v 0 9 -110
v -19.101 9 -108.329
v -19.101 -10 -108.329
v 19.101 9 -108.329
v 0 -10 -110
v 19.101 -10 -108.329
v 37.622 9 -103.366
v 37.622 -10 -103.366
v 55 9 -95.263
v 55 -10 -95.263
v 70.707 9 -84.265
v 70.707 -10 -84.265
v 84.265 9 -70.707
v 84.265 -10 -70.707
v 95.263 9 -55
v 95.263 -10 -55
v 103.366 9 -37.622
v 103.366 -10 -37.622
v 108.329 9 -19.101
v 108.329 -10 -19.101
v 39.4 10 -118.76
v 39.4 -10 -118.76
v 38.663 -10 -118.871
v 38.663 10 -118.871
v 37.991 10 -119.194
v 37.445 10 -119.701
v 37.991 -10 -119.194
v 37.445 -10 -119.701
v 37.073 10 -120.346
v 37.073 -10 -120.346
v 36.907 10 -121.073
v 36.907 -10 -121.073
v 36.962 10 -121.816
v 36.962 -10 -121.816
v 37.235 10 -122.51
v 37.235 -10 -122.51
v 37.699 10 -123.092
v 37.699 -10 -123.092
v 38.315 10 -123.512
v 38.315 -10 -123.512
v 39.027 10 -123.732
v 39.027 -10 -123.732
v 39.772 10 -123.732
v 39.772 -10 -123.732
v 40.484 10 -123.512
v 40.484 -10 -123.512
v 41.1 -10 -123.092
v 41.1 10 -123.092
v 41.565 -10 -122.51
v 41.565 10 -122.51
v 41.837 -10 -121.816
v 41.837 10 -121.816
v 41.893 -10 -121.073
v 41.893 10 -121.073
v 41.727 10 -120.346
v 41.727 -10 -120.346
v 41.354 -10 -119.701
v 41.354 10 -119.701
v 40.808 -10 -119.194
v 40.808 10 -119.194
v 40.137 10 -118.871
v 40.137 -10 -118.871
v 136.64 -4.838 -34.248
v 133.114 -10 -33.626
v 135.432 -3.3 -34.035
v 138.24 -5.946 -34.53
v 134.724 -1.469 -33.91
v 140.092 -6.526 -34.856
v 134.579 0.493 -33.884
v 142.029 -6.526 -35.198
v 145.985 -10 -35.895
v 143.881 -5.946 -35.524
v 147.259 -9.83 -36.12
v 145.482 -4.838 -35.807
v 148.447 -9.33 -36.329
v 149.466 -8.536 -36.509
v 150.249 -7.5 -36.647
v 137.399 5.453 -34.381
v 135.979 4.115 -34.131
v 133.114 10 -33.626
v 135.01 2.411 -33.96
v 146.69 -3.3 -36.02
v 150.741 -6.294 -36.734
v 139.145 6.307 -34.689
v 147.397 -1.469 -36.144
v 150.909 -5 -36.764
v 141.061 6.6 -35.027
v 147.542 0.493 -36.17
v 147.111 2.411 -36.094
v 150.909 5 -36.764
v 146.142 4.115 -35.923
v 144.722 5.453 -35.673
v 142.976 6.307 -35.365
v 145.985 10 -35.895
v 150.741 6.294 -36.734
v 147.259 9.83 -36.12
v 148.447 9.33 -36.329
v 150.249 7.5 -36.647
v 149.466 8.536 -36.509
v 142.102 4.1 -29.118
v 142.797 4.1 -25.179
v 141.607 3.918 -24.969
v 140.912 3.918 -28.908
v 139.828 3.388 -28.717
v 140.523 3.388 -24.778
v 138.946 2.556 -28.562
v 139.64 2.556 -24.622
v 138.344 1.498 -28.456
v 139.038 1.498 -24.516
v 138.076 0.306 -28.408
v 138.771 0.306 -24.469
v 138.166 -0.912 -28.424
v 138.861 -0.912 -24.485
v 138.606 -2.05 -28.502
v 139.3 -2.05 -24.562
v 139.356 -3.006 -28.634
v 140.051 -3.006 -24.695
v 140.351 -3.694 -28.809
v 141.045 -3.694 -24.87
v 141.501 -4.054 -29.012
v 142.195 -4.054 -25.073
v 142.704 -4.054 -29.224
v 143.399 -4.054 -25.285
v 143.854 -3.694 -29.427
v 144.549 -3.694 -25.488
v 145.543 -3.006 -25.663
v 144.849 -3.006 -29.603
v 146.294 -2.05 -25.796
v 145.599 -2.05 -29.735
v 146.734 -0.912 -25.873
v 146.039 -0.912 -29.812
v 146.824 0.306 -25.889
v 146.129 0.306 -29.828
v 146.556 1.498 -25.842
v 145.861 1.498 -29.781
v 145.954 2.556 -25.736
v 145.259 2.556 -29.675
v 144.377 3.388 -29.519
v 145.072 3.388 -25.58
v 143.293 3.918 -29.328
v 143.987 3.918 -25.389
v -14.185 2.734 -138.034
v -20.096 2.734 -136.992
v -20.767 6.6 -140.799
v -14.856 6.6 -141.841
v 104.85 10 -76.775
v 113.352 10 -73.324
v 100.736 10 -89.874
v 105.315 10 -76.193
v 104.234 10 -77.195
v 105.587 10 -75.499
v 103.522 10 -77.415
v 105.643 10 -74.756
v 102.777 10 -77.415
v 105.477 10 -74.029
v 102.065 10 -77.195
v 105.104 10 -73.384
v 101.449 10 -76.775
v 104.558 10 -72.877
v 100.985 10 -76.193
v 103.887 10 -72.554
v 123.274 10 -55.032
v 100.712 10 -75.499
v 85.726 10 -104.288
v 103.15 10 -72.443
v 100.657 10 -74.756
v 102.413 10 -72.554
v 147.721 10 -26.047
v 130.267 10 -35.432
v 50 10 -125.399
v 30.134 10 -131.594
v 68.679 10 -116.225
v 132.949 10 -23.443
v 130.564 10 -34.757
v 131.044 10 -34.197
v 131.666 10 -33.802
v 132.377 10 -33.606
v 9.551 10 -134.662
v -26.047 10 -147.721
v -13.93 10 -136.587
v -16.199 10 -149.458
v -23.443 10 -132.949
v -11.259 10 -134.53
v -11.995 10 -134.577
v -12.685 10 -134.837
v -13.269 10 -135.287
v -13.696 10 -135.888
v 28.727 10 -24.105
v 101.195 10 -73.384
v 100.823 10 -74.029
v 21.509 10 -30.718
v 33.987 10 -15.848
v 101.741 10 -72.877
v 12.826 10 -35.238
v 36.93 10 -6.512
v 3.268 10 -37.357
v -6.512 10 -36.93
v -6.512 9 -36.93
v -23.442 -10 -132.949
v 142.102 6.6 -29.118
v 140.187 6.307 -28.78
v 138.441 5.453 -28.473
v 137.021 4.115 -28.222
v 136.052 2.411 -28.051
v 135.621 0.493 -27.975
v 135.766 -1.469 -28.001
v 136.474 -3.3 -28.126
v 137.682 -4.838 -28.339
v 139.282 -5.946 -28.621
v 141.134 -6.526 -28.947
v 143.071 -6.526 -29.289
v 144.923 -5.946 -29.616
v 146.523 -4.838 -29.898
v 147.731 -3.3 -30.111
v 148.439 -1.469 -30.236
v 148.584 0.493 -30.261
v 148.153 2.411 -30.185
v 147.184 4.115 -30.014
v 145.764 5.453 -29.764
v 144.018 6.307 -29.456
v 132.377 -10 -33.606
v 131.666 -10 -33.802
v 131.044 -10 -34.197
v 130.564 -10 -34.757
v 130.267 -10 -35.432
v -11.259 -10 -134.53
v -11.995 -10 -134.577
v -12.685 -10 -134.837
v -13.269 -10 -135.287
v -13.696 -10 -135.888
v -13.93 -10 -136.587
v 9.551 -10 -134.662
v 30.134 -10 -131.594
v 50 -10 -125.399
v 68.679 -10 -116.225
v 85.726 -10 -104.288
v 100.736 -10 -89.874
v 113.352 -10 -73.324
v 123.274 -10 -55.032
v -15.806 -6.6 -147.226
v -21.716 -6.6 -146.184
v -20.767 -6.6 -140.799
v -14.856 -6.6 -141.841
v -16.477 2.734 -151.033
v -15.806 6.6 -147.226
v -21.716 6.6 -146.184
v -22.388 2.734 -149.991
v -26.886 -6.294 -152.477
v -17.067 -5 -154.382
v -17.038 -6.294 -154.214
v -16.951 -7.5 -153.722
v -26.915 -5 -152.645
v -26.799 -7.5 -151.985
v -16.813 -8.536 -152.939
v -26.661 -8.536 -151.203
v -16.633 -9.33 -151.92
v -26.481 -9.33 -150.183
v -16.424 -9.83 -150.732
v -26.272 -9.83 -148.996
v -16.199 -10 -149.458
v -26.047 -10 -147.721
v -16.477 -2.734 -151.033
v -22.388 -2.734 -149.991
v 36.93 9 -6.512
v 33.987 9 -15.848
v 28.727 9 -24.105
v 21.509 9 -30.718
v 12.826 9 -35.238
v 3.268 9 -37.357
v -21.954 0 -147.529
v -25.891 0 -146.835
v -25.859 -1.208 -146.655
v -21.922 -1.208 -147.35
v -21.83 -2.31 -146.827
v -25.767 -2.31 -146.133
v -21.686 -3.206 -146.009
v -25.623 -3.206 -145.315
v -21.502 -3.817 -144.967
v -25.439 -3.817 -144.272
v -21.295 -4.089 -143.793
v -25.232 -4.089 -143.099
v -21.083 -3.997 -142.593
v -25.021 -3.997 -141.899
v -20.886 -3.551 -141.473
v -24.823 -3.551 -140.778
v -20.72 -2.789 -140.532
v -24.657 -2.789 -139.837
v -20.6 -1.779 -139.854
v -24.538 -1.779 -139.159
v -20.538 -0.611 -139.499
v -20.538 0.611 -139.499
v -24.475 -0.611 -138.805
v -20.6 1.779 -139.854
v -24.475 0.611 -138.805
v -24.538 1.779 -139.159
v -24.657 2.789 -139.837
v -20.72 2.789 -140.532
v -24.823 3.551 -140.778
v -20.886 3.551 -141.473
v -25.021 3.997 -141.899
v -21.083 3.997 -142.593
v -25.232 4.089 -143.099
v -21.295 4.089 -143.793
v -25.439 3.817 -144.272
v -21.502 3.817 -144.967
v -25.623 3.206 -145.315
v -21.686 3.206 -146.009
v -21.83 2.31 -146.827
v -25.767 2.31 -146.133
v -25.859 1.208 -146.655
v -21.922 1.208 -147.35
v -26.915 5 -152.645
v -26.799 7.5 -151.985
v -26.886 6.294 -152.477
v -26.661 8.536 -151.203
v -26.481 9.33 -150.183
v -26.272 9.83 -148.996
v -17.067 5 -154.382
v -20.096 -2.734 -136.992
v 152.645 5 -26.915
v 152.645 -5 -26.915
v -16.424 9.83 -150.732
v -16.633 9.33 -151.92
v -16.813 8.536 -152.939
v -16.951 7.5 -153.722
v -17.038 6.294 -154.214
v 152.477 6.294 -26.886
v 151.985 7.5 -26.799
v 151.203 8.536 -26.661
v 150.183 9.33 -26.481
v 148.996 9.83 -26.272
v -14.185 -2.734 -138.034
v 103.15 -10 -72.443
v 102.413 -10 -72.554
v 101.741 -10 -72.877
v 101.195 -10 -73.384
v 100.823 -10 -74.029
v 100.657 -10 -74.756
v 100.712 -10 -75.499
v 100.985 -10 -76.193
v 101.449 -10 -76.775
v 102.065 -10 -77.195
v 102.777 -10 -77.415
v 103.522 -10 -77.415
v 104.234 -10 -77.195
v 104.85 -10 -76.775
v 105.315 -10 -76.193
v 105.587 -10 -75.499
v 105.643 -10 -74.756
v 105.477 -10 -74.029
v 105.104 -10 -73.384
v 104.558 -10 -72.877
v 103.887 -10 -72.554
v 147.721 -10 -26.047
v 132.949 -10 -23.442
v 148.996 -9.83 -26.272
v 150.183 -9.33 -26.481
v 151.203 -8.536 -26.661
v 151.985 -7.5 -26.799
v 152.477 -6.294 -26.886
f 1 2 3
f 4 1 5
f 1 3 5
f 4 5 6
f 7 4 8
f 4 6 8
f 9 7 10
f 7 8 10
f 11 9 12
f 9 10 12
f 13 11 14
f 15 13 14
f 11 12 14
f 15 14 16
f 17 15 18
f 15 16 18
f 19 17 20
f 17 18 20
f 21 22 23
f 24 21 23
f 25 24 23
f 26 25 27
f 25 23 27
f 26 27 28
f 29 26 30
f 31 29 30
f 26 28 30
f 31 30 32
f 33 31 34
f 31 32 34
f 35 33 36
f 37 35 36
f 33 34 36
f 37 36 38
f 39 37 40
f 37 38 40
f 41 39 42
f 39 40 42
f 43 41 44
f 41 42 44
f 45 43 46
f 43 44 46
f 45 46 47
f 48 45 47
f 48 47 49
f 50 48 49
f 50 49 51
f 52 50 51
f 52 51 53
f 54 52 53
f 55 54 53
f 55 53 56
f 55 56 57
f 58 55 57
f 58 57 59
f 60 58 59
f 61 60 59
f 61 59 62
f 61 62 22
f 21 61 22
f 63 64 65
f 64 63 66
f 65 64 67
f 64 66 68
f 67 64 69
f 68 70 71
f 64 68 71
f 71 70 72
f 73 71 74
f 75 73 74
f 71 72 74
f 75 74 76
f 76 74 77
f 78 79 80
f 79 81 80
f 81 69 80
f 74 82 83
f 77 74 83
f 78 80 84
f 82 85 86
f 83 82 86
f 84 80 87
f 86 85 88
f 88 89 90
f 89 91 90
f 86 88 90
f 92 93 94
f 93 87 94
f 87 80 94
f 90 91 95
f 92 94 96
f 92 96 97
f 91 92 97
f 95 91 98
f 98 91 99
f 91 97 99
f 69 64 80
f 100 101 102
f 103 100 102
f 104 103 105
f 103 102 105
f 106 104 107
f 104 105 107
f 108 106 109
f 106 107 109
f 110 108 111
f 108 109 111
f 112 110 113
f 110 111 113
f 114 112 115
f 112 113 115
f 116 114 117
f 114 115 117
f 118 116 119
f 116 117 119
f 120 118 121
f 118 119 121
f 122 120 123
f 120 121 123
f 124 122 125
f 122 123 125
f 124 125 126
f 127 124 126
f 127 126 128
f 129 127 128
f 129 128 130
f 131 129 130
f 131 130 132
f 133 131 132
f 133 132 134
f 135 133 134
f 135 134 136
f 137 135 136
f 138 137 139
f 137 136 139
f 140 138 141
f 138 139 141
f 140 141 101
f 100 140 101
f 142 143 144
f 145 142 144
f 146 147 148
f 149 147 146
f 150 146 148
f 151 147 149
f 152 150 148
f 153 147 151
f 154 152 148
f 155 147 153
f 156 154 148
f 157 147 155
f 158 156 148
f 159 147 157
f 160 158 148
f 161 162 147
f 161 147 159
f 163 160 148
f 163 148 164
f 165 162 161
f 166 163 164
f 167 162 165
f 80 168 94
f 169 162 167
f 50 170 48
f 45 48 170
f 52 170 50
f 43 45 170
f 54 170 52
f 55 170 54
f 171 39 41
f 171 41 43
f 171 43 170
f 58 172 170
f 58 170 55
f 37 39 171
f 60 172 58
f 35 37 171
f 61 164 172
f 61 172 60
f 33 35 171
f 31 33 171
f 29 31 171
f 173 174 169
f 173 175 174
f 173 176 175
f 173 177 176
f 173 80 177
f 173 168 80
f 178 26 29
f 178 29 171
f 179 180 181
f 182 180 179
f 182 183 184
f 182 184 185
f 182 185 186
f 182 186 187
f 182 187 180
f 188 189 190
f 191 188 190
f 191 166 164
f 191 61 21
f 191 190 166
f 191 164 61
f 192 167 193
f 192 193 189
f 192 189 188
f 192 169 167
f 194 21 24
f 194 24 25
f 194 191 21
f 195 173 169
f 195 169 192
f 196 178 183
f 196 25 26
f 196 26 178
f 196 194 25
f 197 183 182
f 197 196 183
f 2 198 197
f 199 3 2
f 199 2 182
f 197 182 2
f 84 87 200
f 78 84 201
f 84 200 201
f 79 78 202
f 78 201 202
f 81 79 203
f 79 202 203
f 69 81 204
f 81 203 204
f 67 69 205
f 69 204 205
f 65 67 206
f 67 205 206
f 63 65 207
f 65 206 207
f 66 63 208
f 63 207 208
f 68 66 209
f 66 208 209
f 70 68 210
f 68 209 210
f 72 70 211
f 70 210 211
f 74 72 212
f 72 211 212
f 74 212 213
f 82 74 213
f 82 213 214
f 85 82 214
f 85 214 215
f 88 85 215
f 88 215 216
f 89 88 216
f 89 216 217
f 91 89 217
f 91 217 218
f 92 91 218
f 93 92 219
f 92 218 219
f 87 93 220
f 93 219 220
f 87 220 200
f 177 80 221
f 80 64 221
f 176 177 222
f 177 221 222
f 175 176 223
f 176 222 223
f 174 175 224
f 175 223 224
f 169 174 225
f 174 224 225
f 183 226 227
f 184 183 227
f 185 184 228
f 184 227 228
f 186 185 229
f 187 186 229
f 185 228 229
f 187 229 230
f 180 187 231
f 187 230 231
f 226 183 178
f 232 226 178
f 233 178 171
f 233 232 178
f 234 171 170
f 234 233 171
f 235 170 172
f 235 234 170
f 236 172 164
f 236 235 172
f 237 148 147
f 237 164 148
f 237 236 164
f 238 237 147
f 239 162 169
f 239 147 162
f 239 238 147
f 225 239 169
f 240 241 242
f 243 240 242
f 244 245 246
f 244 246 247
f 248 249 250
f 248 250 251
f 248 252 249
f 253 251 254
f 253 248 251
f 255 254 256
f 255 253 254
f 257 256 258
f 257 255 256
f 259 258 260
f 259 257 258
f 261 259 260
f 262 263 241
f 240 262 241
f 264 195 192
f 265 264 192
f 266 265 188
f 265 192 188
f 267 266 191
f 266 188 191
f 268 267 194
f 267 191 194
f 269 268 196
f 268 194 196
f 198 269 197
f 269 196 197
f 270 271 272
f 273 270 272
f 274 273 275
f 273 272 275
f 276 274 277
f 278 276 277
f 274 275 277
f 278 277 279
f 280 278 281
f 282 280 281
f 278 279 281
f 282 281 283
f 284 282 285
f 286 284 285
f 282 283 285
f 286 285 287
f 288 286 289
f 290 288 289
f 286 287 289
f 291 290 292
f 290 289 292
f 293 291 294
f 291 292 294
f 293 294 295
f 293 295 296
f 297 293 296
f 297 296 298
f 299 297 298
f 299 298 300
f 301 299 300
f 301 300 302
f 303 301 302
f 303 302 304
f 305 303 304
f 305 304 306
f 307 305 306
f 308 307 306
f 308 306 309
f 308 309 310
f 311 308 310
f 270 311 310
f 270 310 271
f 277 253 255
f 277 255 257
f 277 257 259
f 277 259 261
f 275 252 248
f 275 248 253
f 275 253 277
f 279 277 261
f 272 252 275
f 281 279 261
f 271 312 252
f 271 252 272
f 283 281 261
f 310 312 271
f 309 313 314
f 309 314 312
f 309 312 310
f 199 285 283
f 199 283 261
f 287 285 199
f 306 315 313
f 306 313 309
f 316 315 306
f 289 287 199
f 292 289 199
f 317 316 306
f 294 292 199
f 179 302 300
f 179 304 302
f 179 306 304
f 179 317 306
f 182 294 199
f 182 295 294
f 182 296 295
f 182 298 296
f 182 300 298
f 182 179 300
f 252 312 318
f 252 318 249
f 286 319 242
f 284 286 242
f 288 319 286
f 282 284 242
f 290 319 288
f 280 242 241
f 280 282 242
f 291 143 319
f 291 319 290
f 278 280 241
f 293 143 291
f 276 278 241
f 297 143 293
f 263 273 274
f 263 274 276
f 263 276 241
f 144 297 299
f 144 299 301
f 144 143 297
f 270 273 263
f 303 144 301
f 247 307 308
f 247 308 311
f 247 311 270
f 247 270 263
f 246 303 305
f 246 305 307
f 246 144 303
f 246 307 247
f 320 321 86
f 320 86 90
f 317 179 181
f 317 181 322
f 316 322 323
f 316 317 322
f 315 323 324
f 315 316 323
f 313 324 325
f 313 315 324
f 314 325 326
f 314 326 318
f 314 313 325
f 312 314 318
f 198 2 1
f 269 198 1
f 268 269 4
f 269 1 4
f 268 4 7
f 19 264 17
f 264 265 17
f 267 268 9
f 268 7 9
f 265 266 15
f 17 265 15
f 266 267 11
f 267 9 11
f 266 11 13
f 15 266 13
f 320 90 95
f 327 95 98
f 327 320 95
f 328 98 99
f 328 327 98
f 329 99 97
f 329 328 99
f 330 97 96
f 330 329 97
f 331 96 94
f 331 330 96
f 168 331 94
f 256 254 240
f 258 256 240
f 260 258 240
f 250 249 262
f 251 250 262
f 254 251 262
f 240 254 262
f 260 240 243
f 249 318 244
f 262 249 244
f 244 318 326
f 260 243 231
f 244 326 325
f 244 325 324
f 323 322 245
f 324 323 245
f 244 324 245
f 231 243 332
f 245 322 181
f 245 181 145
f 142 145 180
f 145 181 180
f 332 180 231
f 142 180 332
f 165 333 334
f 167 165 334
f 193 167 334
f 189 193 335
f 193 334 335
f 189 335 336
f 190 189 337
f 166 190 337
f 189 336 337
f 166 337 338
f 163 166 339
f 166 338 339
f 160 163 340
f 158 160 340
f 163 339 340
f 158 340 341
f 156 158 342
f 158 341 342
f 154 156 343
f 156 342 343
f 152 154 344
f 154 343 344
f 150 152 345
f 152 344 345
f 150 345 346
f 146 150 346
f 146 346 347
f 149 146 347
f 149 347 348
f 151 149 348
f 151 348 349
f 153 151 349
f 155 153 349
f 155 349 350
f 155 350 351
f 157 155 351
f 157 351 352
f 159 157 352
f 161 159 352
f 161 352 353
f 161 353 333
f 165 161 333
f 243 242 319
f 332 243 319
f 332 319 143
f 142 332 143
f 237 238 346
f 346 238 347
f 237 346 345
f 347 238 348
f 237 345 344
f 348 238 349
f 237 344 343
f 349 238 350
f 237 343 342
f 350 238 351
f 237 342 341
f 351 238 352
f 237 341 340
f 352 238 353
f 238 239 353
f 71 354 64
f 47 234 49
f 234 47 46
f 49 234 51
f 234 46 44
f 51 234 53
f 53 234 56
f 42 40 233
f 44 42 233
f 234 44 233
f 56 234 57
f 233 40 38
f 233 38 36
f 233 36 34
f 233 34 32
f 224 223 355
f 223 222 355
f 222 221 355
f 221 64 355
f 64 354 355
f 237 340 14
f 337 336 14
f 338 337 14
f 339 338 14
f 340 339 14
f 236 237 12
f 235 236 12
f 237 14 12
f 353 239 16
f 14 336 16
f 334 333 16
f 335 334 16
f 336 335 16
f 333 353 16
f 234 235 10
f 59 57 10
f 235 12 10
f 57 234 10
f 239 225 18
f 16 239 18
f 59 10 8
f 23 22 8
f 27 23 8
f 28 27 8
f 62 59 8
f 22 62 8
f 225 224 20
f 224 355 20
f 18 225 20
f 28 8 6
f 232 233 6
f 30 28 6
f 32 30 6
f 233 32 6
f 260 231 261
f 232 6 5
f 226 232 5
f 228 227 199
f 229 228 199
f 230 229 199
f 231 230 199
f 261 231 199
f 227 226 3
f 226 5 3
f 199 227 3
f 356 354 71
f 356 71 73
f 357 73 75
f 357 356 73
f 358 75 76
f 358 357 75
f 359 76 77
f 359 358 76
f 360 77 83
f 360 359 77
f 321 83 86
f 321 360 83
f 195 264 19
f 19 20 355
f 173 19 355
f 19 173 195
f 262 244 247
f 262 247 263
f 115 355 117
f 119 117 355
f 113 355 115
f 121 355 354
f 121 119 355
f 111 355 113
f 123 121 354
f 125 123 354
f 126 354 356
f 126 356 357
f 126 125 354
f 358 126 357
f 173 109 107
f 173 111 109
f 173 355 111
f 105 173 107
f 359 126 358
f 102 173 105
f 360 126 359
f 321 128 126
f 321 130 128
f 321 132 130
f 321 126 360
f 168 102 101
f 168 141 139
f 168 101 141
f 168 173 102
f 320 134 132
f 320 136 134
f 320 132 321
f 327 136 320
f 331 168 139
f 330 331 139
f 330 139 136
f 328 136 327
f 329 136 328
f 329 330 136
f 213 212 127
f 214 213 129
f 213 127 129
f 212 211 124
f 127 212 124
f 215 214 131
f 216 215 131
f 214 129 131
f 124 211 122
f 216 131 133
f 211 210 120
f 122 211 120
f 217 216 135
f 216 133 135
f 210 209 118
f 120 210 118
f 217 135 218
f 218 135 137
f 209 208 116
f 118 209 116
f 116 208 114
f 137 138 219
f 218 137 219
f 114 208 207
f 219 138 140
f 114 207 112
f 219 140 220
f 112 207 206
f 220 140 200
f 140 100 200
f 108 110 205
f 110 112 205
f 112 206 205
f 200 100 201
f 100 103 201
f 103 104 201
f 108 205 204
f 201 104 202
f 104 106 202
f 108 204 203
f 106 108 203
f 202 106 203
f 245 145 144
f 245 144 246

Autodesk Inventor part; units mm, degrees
ref_plane "YZ Plane" through (0, 0, 0) normal (1, 0, 0) x (0, 1, 0)
ref_plane "XZ Plane" through (0, 0, 0) normal (0, 1, 0) x (-1, 0, 0)
ref_plane "XY Plane" through (0, 0, 0) normal (0, 0, 1) x (1, 0, 0)
sketch "Sketch1" plane through (0, 0, 0) normal (0, 1, 0) x (-1, 0, 0)
  circle A0 centre (0, 0) radius 135
  circle A1 centre (0, 0) radius 110
  dimension "d0" = 270
  dimension "d1" = 220
extrude "Extrusion1" add sketch "Sketch1" along normal mid plane 20
sketch "Sketch2" plane through (0, 10, 0) normal (0, 1, 0) x (1, 0, 0)
  circle A0 centre (0, 0) radius 37.5
  circle A1 centre (0, 0) radius 135
  dimension "d4" = 75
  dimension "d20" = 270
extrude "Extrusion2" add sketch "Sketch2" against normal blind 1
sketch "Sketch3" plane through (0, 10, 0) normal (0, 1, 0) x (1, 0, 0)
  circle A0 centre (0, 0) radius 127.5
  circle A1 centre (127.5, 0) radius 2.5
  circle A2 centre (103.1497, 74.9426) radius 2.5
  circle A3 centre (39.3997, 121.2597) radius 2.5
  circle A4 centre (-39.3997, 121.2597) radius 2.5
  circle A5 centre (-103.1497, 74.9426) radius 2.5
  circle A6 centre (-127.5, 0) radius 2.5
  circle A7 centre (-103.1497, -74.9426) radius 2.5
  circle A8 centre (-39.3997, -121.2597) radius 2.5
  circle A9 centre (39.3997, -121.2597) radius 2.5
  circle A10 centre (103.1497, -74.9426) radius 2.5
  dimension "d7" = 255
  dimension "d8" = 5
  dimension "d11" = 360
hole "Hole1" at (127.5, 10, 0) at (103.1497, 10, 74.9426) at (39.3997, 10, 121.2597) at (-39.3997, 10, 121.2597) at (-103.1497, 10, 74.9426) at (-127.5, 10, 0) at (-103.1497, 10, -74.9426) at (-39.3997, 10, -121.2597) at (39.3997, 10, -121.2597) at (103.1497, 10, -74.9426) direction (0, -1, 0) diameter 5 end through all
sketch "Sketch4" plane through (0, -10, 0) normal (0, -1, 0) x (1, 0, 0)
  circle A0 centre (0, 0) radius 135
  line L0 (0, 0) -> (132.949, -23.4425)
  line L1 (0, 0) -> (135, 0) construction
  line L2 (0, 0) -> (-23.4425, -132.949)
  circle A1 centre (0, 0) radius 135 projected
  line L3 (0, 0) -> (135, 0) construction
  line L4 (0, 0) -> (-132.949, 23.4425)
  dimension "d21" = 135
  dimension "d22" = 10
  dimension "d23" = 100
extrude "Extrusion3" cut sketch "Sketch4" against normal through all contours A0 L0 L4 | L4 L2 A0
sketch "Sketch5" plane through (-23.4425, -10, -132.949) normal (-0.9848, 0, 0.1736) x (0.1736, 0, 0.9848)
  line L0 (135, 20) -> (0, 20) projected
  line L1 (2.5, 20) -> (-15, 20)
  line L2 (-20, 15) -> (-20, 5)
  line L3 (-15, 0) -> (2.5, 0)
  line L4 (2.5, 0) -> (2.5, 20)
  line L5 (0, 0) -> (0, 20) projected
  arc A0 (-20, 5) -> (-15, 0) centre (-15, 5) ccw
  arc A1 (-15, 20) -> (-20, 15) centre (-15, 15) ccw
  point P0 (135, 10)
  point P1 (-20, 0)
  point P2 (-20, 20)
  point P3 (0, 20)
  dimension "d26" = 22.5
  dimension "d27" = 20
  dimension "d28" = 20
  dimension "d29" = 5
extrude "Extrusion4" add sketch "Sketch5" against normal blind 10
fillet "Fillet1" radius 2.5 1 edges at (-13.53, 0, -134.3203)
sketch "Sketch6" plane through (132.949, -10, -23.4425) normal (0.1736, 0, 0.9848) x (0.9848, 0, -0.1736)
  line L0 (-122.7273, 0) -> (0, 0) projected
  line L1 (-2.5, 0) -> (15, 0)
  line L2 (20, 5) -> (20, 15)
  line L3 (15, 20) -> (-2.5, 20)
  line L4 (-2.5, 20) -> (-2.5, 0)
  line L5 (0, 20) -> (0, 0) projected
  arc A0 (20, 15) -> (15, 20) centre (15, 15) ccw
  arc A1 (15, 0) -> (20, 5) centre (15, 5) ccw
  point P0 (-135, 10)
  point P1 (20, 20)
  point P2 (20, 0)
  point P3 (0, 0)
  dimension "d33" = 22.5
  dimension "d34" = 20
  dimension "d35" = 20
  dimension "d36" = 5
extrude "Extrusion5" add sketch "Sketch6" against normal blind 10
fillet "Fillet2" radius 2.5 1 edges at (130.8473, 0, -33.2262)
sketch "Sketch7" plane through (-13.5944, -10, -134.6855) normal (0.9848, 0, -0.1736) x (-0.1736, 0, -0.9848)
  line L0 (16.6, 12.7338) -> (16.6, 7.2662)
  line L1 (16.6, 7.2662) -> (12.7338, 3.4)
  line L2 (12.7338, 3.4) -> (7.2662, 3.4)
  line L3 (7.2662, 3.4) -> (3.4, 7.2662)
  line L4 (3.4, 7.2662) -> (3.4, 12.7338)
  line L5 (3.4, 12.7338) -> (7.2662, 16.6)
  line L6 (7.2662, 16.6) -> (12.7338, 16.6)
  line L7 (12.7338, 16.6) -> (16.6, 12.7338)
  line L8 (20, 5) -> (20, 15) projected
  line L9 (1.9306, 0) -> (15, 0) projected
  point P0 (-135, 10)
  point P1 (10, 10)
  point P2 (20, 10)
  dimension "d40" = 10
  dimension "d41" = 10
  dimension "d42" = 13.2
extrude "Extrusion6" cut sketch "Sketch7" against normal blind 6
sketch "Sketch8" plane through (-19.5033, -10, -133.6436) normal (0.9848, 0, -0.1736) x (-0.1736, 0, -0.9848)
  line L0 (1.9306, 0) -> (15, 0) projected
  line L1 (20, 5) -> (20, 15) projected
  point P0 (-135, 10)
  point P1 (10, 10)
  dimension "d45" = 10
  dimension "d46" = 10
hole "Hole2" at (-21.2398, 0, -143.4917) direction (-0.9848, 0, 0.1736) diameter 8.2 end through all
sketch "Sketch9" plane through (131.2126, -10, -33.2906) normal (-0.1736, 0, -0.9848) x (-0.9848, 0, 0.1736)
  line L0 (-20, 15) -> (-20, 5) projected
  line L1 (-1.9306, 20) -> (-15, 20) projected
  point P0 (135, 10)
  point P1 (-10, 10)
  dimension "d54" = 10
  dimension "d55" = 10
hole "Hole3" at (141.0606, 0, -35.0271) direction (0.1736, 0, 0.9848) diameter 8.2 end through all counterbore diameter 13.2 counterbore depth 6
properties part number "Cylinder Spacer 25mm_Q2+4"
